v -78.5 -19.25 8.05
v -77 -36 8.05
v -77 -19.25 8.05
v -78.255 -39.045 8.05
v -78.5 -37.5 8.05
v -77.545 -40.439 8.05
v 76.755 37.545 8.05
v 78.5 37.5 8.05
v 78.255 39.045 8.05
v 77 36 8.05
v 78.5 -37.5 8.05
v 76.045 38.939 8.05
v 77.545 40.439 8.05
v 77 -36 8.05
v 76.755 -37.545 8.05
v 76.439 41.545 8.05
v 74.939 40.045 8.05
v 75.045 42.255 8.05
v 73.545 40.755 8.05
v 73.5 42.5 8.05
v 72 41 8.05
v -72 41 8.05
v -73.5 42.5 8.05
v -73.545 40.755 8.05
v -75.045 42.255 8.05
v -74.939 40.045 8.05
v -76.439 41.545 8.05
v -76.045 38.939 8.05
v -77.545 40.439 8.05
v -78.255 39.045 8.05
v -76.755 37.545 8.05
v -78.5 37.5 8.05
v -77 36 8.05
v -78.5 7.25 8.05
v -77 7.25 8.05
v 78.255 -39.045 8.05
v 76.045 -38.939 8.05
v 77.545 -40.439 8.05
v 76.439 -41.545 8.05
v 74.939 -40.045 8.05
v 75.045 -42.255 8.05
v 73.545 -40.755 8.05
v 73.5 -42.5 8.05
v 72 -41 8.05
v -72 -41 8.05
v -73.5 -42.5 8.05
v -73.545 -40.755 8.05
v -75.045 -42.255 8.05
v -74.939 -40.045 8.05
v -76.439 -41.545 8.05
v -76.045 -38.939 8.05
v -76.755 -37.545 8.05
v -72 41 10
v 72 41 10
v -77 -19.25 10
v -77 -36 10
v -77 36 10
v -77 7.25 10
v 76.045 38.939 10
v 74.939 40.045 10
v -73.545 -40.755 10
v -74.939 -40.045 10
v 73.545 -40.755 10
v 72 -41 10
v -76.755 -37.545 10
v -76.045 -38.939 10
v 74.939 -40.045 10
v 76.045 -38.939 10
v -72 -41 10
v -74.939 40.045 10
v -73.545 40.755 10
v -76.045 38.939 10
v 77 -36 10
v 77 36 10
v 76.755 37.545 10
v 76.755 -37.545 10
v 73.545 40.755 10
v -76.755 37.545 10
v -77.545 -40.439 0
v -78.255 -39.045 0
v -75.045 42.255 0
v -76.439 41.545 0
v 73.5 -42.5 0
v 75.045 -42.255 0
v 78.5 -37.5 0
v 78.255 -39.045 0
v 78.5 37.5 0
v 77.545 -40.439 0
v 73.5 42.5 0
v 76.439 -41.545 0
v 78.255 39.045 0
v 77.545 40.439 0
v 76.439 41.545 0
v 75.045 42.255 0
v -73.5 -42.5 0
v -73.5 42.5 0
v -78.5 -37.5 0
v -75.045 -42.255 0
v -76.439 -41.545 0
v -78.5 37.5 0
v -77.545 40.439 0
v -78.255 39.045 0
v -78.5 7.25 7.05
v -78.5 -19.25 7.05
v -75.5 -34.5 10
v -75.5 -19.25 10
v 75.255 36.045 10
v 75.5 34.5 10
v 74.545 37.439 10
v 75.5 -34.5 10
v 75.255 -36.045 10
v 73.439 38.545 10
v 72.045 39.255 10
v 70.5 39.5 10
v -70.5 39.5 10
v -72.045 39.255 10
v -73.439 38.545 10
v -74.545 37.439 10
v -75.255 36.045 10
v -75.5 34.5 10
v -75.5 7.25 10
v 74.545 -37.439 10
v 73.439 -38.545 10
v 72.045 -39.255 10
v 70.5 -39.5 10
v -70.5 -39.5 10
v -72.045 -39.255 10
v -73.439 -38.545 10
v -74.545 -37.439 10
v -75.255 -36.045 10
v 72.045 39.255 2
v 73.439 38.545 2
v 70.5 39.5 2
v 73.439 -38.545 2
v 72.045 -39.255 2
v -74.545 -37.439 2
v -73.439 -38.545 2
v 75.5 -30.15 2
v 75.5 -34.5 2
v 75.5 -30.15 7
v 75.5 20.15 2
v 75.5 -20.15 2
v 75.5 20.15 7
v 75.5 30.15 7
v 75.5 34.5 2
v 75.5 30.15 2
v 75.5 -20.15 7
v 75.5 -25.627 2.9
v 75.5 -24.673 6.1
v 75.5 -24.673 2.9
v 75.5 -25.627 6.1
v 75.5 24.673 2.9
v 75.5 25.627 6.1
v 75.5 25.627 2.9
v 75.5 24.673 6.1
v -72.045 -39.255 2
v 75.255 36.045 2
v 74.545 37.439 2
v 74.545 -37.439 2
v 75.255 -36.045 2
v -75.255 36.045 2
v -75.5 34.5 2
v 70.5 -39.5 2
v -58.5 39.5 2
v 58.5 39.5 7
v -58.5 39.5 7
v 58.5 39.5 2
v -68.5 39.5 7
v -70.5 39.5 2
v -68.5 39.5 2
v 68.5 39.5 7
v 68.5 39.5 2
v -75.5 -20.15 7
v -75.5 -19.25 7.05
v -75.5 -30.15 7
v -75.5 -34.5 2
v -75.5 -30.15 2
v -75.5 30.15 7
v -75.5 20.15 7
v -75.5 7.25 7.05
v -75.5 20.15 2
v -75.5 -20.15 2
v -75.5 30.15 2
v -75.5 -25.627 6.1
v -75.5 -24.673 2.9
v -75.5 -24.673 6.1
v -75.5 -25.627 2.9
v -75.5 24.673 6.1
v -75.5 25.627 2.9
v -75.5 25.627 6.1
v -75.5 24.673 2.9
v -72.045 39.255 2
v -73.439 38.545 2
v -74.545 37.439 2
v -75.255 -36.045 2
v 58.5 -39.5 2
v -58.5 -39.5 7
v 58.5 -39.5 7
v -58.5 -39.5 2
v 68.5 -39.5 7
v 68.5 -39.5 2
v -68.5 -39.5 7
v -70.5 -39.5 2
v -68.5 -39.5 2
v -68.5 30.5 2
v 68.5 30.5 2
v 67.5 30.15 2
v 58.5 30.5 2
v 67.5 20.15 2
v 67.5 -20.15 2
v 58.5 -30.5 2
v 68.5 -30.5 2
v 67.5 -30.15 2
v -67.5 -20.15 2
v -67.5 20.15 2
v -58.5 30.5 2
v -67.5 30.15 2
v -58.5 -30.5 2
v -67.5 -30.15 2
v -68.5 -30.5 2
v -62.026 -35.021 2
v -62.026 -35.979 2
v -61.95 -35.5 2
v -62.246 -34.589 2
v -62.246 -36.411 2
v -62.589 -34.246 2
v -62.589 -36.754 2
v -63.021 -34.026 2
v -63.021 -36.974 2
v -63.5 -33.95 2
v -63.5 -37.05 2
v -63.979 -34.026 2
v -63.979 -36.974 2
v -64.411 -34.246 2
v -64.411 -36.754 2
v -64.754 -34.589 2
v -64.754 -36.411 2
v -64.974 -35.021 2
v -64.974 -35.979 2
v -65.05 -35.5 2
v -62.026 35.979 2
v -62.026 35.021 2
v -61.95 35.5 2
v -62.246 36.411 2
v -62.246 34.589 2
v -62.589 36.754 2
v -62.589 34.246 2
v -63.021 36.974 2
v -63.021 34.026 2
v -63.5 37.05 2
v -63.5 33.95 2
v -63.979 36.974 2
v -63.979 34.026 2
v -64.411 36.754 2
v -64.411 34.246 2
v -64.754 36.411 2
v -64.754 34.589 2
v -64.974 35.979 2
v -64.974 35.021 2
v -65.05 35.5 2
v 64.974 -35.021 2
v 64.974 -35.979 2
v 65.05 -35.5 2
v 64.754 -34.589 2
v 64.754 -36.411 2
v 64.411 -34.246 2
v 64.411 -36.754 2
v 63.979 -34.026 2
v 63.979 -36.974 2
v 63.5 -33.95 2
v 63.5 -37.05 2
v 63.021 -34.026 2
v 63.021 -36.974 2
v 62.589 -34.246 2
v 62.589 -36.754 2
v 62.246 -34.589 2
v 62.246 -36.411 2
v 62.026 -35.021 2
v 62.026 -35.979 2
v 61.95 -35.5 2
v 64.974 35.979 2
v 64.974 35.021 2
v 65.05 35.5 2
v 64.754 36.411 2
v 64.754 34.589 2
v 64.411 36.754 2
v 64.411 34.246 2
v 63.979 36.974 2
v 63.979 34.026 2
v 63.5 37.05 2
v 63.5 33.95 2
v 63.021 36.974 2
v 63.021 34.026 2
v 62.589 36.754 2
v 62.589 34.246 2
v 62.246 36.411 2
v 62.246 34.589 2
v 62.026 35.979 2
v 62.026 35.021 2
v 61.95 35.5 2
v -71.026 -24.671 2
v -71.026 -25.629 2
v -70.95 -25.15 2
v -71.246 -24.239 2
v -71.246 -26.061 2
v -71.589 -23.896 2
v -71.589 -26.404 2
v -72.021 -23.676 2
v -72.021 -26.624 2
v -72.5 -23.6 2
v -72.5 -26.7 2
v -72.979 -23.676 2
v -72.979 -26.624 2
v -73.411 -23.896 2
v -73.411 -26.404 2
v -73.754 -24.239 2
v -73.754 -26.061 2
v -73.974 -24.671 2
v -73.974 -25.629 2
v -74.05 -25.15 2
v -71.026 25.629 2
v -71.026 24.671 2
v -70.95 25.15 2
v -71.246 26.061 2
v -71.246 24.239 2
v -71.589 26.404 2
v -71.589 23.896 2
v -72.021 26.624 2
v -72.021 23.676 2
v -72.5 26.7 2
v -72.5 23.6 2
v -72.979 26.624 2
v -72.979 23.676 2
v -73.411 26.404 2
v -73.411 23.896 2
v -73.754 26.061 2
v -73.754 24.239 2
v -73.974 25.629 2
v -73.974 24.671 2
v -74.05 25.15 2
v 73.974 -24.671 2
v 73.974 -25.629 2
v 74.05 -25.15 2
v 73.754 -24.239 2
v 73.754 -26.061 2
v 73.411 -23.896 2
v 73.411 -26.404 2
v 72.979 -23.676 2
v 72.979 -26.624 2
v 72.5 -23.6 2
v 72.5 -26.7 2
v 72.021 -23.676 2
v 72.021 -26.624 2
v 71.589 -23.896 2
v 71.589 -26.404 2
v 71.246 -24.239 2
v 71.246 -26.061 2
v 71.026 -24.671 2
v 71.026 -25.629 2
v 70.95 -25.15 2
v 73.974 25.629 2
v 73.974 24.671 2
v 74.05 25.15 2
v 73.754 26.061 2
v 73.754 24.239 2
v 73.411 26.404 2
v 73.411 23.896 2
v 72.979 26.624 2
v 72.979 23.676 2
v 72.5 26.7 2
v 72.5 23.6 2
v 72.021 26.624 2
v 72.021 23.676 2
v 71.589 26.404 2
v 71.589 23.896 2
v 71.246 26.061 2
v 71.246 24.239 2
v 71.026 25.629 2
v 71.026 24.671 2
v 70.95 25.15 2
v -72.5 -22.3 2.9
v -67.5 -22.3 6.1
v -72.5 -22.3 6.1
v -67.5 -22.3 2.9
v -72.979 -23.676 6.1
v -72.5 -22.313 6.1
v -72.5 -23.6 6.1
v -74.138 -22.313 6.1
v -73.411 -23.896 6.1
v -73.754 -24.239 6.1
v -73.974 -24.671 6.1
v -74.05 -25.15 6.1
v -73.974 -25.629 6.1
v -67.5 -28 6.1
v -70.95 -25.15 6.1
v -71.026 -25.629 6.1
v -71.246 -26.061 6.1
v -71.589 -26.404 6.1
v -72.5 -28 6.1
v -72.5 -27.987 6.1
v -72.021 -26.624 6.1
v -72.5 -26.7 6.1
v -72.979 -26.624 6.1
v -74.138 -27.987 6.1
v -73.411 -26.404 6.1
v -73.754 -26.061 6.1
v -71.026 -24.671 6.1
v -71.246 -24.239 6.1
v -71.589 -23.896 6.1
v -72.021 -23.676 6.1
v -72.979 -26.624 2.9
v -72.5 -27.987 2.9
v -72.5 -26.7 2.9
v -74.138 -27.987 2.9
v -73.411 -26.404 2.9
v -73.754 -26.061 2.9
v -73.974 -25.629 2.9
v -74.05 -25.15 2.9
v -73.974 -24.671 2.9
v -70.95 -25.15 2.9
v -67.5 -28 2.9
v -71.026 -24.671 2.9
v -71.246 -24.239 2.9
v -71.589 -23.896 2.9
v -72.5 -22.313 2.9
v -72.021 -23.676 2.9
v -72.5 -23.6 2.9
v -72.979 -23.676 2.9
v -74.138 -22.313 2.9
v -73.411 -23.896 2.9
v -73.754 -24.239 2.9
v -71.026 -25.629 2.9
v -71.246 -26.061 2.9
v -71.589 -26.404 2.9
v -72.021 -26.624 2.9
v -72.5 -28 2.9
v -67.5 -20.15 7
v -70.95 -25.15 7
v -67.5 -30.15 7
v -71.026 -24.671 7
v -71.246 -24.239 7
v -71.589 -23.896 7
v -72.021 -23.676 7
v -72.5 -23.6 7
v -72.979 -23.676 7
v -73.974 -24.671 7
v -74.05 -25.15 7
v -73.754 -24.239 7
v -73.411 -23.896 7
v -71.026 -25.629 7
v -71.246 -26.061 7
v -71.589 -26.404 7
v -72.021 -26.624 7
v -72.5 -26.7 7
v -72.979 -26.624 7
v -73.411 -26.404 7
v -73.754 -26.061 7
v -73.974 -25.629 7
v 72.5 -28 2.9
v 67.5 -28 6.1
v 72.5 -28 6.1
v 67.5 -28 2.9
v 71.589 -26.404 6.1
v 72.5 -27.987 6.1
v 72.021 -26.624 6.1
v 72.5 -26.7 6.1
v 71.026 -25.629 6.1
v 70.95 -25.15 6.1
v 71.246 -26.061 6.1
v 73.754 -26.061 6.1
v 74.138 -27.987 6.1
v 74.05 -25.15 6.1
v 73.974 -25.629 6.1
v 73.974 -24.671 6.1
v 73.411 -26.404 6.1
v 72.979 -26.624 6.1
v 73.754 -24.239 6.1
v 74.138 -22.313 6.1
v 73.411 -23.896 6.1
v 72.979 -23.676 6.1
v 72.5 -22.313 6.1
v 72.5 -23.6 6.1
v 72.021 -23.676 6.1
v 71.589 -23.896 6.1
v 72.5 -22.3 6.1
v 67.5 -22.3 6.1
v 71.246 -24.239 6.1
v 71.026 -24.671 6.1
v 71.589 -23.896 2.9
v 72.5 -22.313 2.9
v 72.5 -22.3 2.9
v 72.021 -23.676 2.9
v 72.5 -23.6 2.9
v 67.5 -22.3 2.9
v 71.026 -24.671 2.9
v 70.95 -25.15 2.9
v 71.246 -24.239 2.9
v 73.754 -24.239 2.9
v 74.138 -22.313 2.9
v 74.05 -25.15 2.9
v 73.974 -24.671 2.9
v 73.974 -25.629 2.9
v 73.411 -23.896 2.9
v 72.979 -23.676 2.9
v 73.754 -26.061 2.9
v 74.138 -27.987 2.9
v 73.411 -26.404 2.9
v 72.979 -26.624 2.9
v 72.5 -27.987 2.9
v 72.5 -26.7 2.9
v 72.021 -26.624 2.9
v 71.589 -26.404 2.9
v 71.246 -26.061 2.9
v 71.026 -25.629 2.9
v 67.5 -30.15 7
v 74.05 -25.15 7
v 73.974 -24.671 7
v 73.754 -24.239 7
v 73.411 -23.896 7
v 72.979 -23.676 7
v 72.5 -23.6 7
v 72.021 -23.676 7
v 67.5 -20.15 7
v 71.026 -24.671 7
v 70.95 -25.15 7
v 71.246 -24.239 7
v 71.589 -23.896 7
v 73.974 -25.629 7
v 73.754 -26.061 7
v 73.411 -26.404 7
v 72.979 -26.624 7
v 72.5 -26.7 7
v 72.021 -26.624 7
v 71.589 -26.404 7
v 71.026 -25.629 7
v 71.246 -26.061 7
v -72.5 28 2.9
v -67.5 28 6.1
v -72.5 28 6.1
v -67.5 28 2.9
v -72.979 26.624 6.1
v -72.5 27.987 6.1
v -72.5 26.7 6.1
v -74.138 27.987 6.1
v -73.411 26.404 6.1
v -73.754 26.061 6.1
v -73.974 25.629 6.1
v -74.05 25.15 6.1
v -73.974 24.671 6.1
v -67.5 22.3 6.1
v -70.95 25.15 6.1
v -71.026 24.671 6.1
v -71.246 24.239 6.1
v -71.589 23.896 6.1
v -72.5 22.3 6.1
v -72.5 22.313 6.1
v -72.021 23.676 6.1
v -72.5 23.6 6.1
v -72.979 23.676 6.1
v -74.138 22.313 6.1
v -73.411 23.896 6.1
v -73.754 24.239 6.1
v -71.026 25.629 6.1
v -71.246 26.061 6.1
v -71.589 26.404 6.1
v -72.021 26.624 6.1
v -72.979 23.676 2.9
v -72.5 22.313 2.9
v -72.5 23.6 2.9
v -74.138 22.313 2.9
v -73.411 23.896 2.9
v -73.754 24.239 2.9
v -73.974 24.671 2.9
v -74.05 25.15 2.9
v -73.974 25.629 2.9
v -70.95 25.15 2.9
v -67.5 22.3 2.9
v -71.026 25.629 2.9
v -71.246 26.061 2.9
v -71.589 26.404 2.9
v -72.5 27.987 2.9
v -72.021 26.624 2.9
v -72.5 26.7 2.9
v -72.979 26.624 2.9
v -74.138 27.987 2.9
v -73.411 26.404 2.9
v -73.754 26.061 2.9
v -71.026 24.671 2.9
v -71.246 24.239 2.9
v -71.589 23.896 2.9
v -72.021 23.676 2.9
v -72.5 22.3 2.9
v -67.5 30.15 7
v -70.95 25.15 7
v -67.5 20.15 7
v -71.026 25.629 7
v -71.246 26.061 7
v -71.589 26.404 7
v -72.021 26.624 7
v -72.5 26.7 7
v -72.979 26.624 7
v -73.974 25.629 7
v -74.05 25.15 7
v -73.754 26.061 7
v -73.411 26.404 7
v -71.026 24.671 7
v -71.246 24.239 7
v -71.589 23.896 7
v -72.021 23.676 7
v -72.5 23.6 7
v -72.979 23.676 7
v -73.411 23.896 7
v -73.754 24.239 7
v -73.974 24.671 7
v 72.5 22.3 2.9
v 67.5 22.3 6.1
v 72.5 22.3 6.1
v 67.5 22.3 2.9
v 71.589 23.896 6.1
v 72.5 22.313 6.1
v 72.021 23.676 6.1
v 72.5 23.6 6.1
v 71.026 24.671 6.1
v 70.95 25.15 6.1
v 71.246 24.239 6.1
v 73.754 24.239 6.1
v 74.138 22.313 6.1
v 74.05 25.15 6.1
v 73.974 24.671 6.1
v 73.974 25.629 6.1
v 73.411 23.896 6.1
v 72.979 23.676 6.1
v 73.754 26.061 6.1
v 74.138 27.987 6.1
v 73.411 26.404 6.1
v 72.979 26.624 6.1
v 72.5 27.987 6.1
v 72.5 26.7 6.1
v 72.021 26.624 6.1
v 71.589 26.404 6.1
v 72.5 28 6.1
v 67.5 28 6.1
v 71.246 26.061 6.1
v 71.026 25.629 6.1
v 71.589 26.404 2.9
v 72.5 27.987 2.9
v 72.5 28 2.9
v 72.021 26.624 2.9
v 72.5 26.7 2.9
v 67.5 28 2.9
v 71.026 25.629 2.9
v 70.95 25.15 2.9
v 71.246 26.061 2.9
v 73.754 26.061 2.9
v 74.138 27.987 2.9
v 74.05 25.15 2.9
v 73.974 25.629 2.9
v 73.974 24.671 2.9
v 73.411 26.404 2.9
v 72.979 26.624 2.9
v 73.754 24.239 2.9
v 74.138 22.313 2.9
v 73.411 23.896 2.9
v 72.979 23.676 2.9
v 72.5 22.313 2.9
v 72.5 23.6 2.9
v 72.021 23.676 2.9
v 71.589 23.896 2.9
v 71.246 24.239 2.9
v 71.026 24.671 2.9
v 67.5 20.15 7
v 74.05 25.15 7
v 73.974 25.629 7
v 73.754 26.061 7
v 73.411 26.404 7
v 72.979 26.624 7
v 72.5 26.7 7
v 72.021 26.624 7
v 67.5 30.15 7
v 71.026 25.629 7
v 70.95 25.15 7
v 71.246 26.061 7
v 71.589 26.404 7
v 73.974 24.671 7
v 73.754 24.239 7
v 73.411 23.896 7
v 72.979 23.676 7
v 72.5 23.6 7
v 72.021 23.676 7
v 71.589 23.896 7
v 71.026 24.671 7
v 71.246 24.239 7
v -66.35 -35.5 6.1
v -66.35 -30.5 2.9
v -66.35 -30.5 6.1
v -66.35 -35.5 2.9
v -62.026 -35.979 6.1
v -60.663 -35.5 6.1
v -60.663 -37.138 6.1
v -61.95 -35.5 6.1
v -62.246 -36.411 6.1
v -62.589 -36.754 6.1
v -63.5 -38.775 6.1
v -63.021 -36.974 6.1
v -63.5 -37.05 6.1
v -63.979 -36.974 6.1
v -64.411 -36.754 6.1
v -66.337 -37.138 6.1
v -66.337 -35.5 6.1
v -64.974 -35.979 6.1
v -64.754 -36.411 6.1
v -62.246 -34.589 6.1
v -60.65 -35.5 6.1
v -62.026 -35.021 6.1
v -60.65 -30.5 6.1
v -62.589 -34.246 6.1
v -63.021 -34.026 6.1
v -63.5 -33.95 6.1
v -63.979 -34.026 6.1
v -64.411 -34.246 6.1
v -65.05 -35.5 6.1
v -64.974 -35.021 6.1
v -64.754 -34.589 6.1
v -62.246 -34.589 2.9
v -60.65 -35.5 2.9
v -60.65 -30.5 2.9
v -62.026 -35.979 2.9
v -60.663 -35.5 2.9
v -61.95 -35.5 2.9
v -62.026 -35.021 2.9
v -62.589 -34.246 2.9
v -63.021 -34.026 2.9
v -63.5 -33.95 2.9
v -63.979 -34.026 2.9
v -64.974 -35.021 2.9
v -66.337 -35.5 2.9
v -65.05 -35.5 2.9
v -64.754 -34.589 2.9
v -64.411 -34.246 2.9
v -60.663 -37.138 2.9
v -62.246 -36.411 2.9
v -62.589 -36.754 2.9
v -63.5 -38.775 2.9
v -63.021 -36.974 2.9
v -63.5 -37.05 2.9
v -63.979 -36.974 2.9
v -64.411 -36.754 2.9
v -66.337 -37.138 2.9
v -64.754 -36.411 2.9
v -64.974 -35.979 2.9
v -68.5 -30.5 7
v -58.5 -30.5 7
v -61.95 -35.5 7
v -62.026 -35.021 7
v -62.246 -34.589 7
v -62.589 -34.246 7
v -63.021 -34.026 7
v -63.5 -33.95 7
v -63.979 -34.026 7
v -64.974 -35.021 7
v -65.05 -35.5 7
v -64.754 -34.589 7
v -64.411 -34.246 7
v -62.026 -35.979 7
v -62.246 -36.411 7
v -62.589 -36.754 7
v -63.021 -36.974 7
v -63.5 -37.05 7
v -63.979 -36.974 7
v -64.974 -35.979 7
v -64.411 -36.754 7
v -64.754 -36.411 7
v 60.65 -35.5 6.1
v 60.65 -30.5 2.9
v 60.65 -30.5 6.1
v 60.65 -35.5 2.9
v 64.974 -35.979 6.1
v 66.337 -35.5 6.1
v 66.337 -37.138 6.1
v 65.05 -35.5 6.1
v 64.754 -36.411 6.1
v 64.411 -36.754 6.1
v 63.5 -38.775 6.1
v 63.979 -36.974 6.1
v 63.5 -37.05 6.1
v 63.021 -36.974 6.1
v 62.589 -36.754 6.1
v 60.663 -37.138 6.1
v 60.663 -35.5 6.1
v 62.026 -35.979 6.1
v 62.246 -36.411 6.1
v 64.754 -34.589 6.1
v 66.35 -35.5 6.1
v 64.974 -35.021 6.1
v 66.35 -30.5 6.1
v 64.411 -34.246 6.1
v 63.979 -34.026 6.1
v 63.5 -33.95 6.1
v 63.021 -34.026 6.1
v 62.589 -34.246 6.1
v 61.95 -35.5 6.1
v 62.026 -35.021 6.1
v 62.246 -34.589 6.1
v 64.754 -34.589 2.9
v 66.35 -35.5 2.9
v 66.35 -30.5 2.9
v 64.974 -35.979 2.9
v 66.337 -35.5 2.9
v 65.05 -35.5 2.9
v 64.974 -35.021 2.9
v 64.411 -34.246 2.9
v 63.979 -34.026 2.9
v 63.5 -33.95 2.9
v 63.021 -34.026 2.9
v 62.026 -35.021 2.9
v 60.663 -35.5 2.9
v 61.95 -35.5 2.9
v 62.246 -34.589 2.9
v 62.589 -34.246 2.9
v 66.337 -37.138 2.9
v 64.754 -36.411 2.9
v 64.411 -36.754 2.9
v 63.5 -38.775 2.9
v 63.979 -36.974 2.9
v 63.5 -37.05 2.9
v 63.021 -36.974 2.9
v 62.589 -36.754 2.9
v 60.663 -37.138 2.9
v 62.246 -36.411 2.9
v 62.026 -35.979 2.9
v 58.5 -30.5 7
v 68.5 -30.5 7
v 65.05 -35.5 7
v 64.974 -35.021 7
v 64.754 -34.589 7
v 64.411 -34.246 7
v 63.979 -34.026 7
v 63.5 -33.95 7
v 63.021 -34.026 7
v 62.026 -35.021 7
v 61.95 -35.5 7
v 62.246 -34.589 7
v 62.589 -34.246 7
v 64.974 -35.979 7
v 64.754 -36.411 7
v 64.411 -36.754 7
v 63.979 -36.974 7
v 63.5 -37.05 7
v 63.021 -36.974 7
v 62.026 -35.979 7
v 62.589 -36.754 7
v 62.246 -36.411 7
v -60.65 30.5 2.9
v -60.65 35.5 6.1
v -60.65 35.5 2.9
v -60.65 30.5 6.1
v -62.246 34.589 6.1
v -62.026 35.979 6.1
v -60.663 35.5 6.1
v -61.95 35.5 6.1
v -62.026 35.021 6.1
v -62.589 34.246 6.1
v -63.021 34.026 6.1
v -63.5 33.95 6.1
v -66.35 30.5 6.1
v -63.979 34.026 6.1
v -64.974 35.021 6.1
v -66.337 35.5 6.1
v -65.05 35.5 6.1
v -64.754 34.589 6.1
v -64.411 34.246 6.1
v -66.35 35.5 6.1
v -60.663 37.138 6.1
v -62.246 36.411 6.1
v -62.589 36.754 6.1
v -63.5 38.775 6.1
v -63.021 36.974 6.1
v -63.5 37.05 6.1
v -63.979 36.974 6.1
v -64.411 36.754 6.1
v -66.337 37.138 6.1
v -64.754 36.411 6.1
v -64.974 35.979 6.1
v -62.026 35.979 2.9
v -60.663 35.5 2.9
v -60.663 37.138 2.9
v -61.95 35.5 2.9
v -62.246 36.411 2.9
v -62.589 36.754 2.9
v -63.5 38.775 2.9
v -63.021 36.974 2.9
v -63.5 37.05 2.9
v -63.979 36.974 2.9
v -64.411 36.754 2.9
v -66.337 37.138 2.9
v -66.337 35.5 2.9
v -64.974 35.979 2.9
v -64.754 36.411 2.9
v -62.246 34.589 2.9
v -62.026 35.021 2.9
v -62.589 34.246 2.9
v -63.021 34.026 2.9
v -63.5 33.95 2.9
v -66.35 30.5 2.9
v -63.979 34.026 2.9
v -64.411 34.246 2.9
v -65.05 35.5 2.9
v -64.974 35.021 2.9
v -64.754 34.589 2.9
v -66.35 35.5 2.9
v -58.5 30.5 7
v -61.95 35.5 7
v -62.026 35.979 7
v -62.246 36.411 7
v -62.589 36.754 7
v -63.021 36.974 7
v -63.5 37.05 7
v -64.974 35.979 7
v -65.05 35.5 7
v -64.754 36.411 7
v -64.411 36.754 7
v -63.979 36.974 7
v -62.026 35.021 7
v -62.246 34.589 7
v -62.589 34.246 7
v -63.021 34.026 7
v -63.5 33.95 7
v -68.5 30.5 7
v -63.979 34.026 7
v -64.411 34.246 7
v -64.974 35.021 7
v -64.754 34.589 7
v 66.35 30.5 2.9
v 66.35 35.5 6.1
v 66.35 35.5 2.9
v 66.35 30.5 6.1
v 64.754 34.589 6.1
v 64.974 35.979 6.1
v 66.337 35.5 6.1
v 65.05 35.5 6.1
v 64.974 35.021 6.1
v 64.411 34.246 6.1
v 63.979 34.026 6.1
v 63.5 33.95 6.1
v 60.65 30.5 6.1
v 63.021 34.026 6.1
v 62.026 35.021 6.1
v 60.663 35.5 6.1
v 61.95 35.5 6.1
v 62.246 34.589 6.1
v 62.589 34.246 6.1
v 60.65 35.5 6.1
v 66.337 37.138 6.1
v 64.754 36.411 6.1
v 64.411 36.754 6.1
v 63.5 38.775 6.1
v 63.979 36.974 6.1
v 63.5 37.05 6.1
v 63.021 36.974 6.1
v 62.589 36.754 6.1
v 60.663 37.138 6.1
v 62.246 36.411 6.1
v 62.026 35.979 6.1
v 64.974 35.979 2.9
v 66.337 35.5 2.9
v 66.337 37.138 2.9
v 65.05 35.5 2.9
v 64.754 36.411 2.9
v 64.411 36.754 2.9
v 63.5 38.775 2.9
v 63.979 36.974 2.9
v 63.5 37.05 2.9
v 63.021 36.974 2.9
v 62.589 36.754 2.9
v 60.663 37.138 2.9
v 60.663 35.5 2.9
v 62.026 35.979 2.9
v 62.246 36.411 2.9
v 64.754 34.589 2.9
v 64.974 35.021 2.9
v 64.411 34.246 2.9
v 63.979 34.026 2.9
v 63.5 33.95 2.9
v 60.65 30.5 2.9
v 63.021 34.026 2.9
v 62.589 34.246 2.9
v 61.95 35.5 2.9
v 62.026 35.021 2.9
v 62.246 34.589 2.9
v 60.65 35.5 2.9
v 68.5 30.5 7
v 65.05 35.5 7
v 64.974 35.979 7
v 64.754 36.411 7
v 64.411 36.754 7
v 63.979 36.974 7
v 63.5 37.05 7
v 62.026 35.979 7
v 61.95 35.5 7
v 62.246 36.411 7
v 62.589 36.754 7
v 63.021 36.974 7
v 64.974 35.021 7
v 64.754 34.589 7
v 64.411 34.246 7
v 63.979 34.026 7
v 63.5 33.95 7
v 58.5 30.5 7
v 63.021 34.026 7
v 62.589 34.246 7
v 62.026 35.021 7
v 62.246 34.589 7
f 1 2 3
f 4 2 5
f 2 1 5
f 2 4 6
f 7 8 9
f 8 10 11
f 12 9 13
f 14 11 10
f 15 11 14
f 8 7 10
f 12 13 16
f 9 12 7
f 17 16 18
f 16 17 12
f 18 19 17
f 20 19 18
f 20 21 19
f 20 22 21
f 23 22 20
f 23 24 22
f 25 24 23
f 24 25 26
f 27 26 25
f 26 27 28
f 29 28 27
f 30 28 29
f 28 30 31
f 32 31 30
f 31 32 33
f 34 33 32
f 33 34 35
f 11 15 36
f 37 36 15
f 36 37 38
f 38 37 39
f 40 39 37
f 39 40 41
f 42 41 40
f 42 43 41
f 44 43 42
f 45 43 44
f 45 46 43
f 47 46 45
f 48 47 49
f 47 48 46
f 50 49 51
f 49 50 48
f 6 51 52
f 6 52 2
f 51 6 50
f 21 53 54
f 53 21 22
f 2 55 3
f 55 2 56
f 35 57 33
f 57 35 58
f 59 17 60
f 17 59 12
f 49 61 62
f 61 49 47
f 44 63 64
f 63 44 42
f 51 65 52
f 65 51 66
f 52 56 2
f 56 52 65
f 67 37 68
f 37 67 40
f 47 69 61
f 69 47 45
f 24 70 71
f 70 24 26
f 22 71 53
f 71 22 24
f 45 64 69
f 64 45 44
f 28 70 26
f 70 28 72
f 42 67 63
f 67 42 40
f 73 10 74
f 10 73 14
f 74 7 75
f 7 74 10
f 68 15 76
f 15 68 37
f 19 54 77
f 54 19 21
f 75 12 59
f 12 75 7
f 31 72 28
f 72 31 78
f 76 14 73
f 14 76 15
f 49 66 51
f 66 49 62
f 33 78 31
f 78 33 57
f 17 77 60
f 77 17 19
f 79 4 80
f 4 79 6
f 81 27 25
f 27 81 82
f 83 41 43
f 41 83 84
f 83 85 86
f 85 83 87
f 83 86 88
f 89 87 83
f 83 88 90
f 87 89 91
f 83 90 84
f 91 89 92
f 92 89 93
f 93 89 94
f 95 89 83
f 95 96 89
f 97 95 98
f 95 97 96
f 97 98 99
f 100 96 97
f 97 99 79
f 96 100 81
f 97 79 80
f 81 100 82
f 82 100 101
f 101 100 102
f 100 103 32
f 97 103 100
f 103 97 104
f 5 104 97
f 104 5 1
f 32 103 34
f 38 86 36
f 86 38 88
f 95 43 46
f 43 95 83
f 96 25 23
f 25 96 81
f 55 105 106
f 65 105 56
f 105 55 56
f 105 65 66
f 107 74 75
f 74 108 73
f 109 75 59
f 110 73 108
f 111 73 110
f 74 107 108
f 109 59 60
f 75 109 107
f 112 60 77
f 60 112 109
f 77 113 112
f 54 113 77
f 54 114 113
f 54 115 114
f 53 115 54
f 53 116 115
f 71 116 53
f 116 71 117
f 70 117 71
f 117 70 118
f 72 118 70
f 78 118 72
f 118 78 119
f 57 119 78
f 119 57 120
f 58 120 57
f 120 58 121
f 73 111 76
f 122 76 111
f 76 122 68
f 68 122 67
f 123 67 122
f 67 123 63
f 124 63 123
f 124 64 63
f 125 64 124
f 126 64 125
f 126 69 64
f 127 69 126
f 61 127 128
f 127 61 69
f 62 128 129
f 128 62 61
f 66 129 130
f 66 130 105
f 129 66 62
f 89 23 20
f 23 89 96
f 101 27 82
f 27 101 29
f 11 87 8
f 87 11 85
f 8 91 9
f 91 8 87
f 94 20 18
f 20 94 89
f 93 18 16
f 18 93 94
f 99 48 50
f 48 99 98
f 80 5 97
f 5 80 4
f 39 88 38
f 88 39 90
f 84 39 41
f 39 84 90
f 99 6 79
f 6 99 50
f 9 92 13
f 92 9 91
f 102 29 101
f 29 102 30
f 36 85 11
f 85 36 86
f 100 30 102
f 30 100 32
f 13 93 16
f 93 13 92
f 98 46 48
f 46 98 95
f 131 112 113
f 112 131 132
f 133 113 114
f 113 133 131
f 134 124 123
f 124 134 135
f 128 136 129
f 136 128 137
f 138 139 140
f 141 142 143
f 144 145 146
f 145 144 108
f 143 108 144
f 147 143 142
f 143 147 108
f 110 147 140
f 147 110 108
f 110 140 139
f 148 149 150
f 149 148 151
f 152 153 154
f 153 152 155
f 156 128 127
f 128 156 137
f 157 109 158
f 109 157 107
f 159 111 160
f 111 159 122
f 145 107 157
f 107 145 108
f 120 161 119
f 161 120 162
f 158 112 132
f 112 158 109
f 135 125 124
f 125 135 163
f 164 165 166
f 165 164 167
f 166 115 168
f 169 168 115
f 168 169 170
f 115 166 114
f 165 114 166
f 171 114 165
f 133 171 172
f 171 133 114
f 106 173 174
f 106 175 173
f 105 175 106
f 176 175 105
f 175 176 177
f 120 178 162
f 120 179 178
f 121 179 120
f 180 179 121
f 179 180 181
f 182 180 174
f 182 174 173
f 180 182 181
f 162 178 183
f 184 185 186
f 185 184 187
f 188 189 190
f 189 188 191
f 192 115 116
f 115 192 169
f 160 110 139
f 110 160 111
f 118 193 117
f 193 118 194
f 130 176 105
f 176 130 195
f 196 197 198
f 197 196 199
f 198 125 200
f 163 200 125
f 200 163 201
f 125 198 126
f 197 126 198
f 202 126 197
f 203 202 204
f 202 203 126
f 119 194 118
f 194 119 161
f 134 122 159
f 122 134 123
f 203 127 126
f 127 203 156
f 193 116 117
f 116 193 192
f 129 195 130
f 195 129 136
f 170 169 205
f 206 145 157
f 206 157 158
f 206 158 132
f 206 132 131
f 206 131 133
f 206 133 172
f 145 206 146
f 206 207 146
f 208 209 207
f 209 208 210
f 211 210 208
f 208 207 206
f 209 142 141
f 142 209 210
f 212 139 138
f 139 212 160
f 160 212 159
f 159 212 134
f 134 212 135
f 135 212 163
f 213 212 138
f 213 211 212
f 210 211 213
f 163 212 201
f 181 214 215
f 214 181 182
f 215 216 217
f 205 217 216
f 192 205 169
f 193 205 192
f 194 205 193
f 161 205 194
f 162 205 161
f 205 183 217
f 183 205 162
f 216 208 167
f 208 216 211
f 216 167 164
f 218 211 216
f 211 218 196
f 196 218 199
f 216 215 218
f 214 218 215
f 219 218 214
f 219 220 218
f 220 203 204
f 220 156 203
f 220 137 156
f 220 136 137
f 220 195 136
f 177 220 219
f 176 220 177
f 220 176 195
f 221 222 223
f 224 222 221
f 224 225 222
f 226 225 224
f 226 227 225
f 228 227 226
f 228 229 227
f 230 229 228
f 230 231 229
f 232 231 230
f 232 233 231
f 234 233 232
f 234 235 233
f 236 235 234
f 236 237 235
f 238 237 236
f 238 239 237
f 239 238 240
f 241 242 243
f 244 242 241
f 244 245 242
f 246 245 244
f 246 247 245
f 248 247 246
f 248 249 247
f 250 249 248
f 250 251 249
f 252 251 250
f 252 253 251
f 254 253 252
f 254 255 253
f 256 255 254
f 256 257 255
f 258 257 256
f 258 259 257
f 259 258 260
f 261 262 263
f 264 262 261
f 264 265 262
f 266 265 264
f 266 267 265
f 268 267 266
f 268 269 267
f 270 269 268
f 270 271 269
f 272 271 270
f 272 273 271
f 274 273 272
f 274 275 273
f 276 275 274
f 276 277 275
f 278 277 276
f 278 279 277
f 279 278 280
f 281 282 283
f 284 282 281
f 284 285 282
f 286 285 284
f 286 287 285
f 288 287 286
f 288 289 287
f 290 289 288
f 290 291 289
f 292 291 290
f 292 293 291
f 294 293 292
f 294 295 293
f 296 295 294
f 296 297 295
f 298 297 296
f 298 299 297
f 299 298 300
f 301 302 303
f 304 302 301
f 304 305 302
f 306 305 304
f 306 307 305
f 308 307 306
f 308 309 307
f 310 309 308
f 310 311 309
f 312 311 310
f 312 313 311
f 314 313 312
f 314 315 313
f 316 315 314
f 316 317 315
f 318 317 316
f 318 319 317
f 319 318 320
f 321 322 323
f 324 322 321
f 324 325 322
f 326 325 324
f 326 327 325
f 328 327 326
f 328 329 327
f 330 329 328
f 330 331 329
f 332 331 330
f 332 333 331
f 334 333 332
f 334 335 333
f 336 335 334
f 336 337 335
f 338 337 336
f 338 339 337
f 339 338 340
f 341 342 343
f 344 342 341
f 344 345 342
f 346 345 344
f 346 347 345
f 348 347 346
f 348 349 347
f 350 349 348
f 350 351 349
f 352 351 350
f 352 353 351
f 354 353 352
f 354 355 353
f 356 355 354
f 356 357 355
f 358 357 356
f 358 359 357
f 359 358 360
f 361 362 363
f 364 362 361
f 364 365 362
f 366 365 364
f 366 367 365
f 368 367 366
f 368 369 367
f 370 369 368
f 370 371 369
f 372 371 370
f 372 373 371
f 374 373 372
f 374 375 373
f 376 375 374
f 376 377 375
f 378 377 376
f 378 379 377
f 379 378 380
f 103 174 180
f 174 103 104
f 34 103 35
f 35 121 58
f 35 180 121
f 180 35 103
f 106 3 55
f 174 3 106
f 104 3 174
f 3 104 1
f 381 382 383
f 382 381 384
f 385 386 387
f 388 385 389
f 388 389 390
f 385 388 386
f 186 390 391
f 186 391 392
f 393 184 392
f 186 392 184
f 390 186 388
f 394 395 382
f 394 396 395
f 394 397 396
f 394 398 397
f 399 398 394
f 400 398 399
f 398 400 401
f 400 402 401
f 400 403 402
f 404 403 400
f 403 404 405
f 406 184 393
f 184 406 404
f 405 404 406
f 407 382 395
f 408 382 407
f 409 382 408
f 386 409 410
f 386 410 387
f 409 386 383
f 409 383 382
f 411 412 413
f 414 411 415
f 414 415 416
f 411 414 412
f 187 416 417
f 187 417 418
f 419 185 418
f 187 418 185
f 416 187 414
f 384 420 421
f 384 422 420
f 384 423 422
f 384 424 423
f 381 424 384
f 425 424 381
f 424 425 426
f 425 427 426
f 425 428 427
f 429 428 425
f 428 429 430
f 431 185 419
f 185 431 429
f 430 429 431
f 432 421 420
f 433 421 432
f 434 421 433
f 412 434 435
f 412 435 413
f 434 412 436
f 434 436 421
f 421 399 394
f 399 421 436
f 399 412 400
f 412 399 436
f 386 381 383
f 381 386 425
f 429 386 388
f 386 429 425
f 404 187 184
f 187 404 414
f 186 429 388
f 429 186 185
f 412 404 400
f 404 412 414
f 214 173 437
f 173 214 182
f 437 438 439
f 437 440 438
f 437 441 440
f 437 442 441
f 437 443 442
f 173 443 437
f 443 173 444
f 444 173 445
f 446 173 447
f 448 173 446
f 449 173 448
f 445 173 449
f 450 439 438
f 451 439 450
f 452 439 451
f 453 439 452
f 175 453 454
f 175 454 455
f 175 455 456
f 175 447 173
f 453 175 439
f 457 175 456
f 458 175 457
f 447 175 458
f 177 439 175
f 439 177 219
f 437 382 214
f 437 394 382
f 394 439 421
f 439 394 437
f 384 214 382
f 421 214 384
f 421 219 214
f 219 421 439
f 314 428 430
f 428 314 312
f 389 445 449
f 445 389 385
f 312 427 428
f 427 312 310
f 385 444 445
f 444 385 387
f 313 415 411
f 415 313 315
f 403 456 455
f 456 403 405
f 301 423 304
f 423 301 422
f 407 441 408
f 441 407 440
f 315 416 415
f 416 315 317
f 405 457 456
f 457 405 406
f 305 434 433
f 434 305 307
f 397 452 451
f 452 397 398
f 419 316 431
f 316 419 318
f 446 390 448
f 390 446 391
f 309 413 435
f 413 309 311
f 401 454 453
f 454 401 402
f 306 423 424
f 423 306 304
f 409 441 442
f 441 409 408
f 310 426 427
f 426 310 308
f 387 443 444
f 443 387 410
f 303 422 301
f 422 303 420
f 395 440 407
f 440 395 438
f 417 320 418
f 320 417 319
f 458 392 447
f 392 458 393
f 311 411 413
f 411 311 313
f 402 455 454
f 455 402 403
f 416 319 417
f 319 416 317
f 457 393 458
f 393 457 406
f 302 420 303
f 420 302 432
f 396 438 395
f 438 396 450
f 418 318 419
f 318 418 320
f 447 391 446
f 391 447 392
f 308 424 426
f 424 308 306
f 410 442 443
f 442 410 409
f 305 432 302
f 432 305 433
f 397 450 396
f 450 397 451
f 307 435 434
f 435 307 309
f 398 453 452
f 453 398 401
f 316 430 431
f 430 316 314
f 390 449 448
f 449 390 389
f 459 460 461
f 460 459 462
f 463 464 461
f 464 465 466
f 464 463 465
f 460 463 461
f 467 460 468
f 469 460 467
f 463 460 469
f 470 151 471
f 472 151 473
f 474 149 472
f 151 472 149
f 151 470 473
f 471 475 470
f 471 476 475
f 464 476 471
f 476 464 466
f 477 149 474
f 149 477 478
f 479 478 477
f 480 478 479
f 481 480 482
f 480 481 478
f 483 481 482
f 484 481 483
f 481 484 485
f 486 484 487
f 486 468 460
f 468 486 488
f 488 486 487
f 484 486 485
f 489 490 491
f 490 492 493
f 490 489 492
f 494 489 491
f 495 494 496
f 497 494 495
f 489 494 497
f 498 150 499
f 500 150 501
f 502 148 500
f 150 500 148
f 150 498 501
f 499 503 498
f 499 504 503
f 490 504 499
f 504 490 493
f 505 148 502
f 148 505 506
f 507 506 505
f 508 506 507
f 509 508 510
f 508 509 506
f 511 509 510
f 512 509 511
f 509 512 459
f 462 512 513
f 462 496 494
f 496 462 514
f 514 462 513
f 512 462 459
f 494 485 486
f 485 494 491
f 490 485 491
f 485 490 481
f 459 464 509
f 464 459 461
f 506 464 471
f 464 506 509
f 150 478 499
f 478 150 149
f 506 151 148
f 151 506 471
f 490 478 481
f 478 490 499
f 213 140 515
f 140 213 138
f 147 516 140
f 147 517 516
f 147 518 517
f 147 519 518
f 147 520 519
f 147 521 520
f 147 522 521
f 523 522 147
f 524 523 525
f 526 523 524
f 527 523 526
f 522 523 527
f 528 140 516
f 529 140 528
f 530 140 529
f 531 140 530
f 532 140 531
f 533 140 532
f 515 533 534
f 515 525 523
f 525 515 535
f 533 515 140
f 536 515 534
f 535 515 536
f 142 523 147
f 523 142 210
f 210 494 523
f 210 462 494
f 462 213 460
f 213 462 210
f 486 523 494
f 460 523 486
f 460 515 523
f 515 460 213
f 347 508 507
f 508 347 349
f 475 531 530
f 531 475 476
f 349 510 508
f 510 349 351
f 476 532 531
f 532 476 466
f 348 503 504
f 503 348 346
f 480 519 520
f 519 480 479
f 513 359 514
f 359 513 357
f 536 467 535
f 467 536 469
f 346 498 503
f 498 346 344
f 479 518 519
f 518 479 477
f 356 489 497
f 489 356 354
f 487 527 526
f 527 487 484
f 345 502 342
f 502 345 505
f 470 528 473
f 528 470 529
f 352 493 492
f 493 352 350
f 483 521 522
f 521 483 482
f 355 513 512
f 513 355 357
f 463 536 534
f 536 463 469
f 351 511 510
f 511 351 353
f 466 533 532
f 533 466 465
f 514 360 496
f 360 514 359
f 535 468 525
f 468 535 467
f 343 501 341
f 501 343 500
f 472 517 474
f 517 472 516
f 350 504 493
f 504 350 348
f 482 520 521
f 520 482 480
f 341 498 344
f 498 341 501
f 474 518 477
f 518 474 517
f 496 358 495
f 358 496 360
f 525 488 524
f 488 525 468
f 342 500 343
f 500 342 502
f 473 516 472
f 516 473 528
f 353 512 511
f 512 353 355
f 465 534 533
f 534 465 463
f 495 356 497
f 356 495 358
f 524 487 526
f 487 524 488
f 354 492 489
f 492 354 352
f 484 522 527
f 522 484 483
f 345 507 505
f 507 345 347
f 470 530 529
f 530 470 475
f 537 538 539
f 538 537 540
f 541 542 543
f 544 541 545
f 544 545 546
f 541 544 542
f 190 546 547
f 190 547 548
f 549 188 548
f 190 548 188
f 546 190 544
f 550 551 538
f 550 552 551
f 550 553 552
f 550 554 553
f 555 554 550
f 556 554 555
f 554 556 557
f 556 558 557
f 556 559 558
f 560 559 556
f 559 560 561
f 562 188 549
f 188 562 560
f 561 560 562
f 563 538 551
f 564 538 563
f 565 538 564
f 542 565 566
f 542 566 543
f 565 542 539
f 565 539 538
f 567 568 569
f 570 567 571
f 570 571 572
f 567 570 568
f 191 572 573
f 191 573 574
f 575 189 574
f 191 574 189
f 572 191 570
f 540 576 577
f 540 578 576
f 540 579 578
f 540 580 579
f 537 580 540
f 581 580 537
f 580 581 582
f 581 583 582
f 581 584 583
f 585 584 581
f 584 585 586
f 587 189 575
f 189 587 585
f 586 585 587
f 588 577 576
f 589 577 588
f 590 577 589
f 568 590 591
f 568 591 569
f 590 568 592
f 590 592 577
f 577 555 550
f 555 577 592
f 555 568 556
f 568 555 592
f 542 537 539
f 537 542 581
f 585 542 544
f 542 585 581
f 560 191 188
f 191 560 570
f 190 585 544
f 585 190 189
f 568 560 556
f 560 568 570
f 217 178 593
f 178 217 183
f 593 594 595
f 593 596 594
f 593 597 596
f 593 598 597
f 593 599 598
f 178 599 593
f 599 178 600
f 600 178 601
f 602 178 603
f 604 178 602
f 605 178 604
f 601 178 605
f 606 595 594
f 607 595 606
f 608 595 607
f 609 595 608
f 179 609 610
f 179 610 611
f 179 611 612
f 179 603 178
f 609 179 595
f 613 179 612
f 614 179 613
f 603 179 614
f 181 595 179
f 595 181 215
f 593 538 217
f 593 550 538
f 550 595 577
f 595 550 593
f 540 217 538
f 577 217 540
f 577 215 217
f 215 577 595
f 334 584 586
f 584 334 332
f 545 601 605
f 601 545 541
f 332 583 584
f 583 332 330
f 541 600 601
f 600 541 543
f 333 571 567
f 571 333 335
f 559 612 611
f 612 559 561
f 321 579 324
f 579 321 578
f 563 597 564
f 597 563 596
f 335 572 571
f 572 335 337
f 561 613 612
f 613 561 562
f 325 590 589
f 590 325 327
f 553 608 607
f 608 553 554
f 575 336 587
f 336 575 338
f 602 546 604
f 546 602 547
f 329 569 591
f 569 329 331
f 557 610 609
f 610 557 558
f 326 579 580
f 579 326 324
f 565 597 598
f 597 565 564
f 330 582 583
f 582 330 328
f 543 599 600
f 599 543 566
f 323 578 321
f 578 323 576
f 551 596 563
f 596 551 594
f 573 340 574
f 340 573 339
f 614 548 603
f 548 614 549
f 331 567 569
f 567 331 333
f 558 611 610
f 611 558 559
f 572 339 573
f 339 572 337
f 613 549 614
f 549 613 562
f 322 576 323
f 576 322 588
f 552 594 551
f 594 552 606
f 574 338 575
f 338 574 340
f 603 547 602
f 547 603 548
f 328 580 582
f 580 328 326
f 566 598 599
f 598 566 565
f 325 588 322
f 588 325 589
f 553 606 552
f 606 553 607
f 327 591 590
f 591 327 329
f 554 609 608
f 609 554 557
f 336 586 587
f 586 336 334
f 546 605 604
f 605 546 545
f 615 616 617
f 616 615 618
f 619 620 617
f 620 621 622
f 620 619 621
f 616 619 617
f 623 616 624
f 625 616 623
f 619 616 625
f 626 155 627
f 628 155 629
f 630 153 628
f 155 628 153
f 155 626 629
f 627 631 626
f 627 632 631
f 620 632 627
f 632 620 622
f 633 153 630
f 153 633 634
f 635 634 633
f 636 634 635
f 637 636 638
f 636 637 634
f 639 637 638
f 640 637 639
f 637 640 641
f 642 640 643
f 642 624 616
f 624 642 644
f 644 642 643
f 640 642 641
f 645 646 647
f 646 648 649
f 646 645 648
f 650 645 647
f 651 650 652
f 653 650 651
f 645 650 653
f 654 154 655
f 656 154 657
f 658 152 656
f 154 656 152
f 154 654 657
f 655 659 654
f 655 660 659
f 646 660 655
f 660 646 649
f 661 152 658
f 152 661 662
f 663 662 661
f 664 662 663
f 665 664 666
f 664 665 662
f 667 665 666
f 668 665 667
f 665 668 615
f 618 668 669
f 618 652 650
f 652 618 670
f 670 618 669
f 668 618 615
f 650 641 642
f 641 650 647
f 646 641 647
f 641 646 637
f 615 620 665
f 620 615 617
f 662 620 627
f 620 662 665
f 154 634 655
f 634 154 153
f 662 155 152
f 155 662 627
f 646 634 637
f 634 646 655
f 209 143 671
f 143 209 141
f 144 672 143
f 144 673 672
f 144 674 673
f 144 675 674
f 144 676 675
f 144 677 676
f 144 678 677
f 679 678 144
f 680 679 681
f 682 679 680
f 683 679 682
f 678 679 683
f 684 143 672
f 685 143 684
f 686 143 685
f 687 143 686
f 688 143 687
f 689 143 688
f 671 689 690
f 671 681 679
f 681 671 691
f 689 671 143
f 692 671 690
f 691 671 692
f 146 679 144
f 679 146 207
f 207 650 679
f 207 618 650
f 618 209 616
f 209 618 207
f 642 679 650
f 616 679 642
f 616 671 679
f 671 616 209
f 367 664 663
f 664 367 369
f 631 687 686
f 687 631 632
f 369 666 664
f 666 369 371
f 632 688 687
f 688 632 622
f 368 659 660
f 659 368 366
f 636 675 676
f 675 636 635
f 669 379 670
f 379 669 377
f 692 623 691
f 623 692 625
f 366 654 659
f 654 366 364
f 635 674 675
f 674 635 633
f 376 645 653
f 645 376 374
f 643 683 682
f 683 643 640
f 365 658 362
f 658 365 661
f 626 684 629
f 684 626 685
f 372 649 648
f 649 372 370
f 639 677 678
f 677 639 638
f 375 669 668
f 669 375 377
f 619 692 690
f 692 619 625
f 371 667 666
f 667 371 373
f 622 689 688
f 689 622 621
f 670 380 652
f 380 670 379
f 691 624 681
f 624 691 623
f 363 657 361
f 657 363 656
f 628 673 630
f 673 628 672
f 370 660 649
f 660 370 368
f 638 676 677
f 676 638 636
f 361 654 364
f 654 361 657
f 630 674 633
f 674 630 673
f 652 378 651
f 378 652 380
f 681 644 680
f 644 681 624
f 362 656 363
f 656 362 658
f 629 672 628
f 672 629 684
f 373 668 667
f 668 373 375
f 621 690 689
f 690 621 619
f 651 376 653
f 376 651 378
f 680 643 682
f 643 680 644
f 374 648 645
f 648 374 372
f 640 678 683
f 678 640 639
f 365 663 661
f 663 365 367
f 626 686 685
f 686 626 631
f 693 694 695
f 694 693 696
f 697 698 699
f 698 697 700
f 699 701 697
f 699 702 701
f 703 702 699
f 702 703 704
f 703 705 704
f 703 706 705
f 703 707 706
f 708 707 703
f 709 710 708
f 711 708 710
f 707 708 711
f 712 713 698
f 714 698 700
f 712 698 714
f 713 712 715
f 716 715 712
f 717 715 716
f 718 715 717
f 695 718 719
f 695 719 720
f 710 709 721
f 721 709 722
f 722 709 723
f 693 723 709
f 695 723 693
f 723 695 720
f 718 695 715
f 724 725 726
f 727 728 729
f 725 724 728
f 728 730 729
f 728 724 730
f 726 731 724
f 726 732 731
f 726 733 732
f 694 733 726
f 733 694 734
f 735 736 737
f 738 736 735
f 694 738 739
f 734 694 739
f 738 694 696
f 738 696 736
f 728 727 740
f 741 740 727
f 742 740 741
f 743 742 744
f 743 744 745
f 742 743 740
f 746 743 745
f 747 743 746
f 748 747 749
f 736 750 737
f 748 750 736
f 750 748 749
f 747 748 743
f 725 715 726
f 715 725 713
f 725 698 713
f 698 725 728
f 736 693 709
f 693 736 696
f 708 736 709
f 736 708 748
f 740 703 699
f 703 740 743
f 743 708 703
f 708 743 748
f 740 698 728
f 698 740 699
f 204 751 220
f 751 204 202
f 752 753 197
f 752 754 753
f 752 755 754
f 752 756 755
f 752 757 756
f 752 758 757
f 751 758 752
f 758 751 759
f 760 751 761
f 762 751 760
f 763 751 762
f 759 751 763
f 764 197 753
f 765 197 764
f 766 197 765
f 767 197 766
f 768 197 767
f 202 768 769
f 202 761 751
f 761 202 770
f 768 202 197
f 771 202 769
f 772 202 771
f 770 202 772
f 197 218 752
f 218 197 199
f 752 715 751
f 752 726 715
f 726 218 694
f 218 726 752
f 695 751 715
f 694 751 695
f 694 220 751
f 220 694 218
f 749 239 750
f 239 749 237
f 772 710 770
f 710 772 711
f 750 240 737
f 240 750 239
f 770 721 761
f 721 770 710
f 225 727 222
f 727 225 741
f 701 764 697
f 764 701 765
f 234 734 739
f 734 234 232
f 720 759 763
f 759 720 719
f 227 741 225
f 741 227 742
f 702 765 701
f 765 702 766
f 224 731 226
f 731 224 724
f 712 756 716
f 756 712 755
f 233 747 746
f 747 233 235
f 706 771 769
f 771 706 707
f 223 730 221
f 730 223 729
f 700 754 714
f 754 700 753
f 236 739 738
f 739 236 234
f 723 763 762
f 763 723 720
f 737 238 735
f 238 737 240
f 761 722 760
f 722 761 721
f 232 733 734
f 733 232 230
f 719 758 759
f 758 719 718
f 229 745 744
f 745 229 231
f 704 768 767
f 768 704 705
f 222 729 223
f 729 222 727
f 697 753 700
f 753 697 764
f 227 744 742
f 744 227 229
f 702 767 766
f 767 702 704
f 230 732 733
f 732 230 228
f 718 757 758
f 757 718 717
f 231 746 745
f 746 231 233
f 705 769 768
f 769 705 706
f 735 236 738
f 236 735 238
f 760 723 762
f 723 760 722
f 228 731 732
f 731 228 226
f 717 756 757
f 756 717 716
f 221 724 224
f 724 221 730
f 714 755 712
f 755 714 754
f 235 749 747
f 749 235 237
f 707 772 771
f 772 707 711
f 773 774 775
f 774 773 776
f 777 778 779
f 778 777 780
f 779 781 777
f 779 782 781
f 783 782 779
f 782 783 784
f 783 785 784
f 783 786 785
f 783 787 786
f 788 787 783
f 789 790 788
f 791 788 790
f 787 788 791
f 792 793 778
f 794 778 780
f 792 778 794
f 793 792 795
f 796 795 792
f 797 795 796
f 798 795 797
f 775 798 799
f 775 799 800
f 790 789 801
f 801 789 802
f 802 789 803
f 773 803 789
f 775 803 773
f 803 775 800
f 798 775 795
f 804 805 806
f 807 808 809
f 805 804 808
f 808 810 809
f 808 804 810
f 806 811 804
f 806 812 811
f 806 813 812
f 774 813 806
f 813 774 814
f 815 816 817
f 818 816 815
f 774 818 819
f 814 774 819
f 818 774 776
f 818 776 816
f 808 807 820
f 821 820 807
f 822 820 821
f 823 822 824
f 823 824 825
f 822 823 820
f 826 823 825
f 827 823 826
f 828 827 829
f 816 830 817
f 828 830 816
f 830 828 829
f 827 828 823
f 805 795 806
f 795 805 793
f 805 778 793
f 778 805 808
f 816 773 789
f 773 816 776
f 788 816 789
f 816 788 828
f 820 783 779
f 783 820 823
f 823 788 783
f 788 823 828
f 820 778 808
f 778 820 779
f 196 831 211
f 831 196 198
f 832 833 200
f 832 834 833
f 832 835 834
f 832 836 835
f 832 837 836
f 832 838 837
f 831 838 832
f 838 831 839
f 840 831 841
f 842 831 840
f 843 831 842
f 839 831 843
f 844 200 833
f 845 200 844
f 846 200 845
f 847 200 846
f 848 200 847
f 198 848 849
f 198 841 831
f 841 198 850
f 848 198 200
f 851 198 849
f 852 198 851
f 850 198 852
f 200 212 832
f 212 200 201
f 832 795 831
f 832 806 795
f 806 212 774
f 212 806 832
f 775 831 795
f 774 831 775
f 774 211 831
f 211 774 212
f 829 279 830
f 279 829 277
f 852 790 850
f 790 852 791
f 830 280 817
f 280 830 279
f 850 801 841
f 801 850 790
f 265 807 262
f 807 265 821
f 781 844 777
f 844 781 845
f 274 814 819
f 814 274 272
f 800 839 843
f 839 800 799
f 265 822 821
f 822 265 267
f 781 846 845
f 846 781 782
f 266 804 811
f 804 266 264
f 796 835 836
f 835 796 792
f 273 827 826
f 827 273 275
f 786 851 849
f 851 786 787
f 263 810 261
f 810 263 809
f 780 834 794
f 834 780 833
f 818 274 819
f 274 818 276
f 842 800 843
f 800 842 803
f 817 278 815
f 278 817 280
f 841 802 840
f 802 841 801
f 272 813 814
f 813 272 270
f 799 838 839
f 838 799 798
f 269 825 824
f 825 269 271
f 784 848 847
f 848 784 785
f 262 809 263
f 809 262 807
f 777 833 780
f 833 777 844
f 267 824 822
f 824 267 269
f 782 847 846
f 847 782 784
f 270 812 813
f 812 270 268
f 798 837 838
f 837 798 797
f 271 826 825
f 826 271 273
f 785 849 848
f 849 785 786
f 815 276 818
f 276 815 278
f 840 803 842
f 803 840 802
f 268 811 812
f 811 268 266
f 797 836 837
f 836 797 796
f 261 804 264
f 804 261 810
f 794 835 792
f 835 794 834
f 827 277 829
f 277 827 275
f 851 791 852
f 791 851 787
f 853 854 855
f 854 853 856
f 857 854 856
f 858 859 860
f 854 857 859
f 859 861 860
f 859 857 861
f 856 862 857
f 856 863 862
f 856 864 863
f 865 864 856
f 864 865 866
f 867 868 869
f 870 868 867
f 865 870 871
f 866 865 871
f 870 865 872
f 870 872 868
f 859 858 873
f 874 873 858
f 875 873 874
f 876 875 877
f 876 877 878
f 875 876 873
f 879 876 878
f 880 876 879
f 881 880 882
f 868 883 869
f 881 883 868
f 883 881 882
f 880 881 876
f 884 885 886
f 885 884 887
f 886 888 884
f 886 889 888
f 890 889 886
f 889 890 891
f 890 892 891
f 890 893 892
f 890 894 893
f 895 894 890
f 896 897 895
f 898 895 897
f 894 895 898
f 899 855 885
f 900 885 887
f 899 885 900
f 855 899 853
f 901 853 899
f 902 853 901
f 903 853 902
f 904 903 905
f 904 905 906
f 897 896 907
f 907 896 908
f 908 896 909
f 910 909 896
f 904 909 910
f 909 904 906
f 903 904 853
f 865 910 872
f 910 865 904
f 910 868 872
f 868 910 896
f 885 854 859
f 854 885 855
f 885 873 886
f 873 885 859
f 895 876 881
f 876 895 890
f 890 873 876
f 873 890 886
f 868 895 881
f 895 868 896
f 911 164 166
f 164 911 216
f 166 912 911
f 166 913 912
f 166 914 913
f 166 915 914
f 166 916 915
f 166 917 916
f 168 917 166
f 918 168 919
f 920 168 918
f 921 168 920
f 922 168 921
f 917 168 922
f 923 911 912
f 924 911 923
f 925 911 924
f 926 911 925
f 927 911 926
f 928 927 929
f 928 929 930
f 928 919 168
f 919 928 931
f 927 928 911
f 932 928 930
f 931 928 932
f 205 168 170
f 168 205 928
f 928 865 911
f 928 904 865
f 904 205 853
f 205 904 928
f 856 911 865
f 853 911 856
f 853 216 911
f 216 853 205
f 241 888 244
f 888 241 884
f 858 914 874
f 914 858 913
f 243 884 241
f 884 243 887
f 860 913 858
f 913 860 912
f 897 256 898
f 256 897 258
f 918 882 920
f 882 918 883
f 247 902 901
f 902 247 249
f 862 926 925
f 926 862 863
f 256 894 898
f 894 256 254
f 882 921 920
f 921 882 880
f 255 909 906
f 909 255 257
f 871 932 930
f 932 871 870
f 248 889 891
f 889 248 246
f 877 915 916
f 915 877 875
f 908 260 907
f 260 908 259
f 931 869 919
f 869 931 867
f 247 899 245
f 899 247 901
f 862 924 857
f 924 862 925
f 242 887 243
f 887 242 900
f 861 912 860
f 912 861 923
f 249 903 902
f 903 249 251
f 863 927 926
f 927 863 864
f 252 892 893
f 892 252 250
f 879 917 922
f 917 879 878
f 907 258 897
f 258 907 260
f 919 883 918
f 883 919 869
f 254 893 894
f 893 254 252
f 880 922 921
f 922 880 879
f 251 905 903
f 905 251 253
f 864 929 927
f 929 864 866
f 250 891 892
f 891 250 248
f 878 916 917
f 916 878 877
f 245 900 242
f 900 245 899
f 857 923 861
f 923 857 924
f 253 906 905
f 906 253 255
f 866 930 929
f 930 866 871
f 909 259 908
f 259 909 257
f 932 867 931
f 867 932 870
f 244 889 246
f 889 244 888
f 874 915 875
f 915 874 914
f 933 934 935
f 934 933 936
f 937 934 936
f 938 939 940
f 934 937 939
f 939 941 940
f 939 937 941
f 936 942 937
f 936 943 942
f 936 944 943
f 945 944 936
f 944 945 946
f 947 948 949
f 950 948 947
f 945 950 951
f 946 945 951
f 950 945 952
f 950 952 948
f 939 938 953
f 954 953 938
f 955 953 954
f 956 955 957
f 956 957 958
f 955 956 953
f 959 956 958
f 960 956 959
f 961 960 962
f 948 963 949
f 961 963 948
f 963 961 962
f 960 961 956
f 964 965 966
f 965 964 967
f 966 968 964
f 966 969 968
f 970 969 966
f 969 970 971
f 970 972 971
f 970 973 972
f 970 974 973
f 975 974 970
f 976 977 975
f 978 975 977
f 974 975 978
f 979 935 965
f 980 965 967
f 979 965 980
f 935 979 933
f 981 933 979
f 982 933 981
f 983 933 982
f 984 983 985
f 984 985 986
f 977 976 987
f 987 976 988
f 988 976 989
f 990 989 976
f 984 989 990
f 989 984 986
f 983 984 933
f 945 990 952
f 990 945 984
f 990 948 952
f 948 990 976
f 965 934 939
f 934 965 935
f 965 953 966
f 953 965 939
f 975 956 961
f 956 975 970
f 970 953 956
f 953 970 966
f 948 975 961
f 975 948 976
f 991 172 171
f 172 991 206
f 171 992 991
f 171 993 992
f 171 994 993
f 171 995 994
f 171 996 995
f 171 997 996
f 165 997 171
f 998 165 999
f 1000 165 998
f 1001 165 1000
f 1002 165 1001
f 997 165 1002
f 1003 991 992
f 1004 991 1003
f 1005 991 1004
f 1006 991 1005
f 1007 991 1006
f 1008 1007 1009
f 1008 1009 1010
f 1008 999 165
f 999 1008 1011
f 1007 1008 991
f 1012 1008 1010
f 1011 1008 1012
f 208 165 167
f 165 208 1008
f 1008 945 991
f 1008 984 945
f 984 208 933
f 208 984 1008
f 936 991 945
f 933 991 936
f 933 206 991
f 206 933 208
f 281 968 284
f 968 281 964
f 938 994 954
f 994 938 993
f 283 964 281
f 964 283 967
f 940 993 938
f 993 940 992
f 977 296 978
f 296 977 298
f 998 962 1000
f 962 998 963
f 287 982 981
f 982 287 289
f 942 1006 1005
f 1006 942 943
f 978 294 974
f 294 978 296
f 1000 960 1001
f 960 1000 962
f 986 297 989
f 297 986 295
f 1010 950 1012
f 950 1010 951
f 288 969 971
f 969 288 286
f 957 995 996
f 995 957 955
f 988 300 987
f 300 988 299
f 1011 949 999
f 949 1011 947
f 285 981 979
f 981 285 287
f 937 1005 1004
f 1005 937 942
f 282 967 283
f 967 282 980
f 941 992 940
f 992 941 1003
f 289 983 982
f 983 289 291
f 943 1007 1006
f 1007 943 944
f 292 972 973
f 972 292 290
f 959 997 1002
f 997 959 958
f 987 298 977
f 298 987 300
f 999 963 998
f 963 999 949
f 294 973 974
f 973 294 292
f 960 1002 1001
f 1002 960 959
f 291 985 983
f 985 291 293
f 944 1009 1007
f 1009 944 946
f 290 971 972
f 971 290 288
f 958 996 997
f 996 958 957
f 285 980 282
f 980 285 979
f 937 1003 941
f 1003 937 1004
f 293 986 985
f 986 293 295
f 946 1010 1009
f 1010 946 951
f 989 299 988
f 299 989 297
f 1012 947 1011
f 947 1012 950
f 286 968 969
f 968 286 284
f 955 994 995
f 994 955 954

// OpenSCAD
/* helper file for creating bottom.stl */
use <lcd_case.scad>
bottom();
